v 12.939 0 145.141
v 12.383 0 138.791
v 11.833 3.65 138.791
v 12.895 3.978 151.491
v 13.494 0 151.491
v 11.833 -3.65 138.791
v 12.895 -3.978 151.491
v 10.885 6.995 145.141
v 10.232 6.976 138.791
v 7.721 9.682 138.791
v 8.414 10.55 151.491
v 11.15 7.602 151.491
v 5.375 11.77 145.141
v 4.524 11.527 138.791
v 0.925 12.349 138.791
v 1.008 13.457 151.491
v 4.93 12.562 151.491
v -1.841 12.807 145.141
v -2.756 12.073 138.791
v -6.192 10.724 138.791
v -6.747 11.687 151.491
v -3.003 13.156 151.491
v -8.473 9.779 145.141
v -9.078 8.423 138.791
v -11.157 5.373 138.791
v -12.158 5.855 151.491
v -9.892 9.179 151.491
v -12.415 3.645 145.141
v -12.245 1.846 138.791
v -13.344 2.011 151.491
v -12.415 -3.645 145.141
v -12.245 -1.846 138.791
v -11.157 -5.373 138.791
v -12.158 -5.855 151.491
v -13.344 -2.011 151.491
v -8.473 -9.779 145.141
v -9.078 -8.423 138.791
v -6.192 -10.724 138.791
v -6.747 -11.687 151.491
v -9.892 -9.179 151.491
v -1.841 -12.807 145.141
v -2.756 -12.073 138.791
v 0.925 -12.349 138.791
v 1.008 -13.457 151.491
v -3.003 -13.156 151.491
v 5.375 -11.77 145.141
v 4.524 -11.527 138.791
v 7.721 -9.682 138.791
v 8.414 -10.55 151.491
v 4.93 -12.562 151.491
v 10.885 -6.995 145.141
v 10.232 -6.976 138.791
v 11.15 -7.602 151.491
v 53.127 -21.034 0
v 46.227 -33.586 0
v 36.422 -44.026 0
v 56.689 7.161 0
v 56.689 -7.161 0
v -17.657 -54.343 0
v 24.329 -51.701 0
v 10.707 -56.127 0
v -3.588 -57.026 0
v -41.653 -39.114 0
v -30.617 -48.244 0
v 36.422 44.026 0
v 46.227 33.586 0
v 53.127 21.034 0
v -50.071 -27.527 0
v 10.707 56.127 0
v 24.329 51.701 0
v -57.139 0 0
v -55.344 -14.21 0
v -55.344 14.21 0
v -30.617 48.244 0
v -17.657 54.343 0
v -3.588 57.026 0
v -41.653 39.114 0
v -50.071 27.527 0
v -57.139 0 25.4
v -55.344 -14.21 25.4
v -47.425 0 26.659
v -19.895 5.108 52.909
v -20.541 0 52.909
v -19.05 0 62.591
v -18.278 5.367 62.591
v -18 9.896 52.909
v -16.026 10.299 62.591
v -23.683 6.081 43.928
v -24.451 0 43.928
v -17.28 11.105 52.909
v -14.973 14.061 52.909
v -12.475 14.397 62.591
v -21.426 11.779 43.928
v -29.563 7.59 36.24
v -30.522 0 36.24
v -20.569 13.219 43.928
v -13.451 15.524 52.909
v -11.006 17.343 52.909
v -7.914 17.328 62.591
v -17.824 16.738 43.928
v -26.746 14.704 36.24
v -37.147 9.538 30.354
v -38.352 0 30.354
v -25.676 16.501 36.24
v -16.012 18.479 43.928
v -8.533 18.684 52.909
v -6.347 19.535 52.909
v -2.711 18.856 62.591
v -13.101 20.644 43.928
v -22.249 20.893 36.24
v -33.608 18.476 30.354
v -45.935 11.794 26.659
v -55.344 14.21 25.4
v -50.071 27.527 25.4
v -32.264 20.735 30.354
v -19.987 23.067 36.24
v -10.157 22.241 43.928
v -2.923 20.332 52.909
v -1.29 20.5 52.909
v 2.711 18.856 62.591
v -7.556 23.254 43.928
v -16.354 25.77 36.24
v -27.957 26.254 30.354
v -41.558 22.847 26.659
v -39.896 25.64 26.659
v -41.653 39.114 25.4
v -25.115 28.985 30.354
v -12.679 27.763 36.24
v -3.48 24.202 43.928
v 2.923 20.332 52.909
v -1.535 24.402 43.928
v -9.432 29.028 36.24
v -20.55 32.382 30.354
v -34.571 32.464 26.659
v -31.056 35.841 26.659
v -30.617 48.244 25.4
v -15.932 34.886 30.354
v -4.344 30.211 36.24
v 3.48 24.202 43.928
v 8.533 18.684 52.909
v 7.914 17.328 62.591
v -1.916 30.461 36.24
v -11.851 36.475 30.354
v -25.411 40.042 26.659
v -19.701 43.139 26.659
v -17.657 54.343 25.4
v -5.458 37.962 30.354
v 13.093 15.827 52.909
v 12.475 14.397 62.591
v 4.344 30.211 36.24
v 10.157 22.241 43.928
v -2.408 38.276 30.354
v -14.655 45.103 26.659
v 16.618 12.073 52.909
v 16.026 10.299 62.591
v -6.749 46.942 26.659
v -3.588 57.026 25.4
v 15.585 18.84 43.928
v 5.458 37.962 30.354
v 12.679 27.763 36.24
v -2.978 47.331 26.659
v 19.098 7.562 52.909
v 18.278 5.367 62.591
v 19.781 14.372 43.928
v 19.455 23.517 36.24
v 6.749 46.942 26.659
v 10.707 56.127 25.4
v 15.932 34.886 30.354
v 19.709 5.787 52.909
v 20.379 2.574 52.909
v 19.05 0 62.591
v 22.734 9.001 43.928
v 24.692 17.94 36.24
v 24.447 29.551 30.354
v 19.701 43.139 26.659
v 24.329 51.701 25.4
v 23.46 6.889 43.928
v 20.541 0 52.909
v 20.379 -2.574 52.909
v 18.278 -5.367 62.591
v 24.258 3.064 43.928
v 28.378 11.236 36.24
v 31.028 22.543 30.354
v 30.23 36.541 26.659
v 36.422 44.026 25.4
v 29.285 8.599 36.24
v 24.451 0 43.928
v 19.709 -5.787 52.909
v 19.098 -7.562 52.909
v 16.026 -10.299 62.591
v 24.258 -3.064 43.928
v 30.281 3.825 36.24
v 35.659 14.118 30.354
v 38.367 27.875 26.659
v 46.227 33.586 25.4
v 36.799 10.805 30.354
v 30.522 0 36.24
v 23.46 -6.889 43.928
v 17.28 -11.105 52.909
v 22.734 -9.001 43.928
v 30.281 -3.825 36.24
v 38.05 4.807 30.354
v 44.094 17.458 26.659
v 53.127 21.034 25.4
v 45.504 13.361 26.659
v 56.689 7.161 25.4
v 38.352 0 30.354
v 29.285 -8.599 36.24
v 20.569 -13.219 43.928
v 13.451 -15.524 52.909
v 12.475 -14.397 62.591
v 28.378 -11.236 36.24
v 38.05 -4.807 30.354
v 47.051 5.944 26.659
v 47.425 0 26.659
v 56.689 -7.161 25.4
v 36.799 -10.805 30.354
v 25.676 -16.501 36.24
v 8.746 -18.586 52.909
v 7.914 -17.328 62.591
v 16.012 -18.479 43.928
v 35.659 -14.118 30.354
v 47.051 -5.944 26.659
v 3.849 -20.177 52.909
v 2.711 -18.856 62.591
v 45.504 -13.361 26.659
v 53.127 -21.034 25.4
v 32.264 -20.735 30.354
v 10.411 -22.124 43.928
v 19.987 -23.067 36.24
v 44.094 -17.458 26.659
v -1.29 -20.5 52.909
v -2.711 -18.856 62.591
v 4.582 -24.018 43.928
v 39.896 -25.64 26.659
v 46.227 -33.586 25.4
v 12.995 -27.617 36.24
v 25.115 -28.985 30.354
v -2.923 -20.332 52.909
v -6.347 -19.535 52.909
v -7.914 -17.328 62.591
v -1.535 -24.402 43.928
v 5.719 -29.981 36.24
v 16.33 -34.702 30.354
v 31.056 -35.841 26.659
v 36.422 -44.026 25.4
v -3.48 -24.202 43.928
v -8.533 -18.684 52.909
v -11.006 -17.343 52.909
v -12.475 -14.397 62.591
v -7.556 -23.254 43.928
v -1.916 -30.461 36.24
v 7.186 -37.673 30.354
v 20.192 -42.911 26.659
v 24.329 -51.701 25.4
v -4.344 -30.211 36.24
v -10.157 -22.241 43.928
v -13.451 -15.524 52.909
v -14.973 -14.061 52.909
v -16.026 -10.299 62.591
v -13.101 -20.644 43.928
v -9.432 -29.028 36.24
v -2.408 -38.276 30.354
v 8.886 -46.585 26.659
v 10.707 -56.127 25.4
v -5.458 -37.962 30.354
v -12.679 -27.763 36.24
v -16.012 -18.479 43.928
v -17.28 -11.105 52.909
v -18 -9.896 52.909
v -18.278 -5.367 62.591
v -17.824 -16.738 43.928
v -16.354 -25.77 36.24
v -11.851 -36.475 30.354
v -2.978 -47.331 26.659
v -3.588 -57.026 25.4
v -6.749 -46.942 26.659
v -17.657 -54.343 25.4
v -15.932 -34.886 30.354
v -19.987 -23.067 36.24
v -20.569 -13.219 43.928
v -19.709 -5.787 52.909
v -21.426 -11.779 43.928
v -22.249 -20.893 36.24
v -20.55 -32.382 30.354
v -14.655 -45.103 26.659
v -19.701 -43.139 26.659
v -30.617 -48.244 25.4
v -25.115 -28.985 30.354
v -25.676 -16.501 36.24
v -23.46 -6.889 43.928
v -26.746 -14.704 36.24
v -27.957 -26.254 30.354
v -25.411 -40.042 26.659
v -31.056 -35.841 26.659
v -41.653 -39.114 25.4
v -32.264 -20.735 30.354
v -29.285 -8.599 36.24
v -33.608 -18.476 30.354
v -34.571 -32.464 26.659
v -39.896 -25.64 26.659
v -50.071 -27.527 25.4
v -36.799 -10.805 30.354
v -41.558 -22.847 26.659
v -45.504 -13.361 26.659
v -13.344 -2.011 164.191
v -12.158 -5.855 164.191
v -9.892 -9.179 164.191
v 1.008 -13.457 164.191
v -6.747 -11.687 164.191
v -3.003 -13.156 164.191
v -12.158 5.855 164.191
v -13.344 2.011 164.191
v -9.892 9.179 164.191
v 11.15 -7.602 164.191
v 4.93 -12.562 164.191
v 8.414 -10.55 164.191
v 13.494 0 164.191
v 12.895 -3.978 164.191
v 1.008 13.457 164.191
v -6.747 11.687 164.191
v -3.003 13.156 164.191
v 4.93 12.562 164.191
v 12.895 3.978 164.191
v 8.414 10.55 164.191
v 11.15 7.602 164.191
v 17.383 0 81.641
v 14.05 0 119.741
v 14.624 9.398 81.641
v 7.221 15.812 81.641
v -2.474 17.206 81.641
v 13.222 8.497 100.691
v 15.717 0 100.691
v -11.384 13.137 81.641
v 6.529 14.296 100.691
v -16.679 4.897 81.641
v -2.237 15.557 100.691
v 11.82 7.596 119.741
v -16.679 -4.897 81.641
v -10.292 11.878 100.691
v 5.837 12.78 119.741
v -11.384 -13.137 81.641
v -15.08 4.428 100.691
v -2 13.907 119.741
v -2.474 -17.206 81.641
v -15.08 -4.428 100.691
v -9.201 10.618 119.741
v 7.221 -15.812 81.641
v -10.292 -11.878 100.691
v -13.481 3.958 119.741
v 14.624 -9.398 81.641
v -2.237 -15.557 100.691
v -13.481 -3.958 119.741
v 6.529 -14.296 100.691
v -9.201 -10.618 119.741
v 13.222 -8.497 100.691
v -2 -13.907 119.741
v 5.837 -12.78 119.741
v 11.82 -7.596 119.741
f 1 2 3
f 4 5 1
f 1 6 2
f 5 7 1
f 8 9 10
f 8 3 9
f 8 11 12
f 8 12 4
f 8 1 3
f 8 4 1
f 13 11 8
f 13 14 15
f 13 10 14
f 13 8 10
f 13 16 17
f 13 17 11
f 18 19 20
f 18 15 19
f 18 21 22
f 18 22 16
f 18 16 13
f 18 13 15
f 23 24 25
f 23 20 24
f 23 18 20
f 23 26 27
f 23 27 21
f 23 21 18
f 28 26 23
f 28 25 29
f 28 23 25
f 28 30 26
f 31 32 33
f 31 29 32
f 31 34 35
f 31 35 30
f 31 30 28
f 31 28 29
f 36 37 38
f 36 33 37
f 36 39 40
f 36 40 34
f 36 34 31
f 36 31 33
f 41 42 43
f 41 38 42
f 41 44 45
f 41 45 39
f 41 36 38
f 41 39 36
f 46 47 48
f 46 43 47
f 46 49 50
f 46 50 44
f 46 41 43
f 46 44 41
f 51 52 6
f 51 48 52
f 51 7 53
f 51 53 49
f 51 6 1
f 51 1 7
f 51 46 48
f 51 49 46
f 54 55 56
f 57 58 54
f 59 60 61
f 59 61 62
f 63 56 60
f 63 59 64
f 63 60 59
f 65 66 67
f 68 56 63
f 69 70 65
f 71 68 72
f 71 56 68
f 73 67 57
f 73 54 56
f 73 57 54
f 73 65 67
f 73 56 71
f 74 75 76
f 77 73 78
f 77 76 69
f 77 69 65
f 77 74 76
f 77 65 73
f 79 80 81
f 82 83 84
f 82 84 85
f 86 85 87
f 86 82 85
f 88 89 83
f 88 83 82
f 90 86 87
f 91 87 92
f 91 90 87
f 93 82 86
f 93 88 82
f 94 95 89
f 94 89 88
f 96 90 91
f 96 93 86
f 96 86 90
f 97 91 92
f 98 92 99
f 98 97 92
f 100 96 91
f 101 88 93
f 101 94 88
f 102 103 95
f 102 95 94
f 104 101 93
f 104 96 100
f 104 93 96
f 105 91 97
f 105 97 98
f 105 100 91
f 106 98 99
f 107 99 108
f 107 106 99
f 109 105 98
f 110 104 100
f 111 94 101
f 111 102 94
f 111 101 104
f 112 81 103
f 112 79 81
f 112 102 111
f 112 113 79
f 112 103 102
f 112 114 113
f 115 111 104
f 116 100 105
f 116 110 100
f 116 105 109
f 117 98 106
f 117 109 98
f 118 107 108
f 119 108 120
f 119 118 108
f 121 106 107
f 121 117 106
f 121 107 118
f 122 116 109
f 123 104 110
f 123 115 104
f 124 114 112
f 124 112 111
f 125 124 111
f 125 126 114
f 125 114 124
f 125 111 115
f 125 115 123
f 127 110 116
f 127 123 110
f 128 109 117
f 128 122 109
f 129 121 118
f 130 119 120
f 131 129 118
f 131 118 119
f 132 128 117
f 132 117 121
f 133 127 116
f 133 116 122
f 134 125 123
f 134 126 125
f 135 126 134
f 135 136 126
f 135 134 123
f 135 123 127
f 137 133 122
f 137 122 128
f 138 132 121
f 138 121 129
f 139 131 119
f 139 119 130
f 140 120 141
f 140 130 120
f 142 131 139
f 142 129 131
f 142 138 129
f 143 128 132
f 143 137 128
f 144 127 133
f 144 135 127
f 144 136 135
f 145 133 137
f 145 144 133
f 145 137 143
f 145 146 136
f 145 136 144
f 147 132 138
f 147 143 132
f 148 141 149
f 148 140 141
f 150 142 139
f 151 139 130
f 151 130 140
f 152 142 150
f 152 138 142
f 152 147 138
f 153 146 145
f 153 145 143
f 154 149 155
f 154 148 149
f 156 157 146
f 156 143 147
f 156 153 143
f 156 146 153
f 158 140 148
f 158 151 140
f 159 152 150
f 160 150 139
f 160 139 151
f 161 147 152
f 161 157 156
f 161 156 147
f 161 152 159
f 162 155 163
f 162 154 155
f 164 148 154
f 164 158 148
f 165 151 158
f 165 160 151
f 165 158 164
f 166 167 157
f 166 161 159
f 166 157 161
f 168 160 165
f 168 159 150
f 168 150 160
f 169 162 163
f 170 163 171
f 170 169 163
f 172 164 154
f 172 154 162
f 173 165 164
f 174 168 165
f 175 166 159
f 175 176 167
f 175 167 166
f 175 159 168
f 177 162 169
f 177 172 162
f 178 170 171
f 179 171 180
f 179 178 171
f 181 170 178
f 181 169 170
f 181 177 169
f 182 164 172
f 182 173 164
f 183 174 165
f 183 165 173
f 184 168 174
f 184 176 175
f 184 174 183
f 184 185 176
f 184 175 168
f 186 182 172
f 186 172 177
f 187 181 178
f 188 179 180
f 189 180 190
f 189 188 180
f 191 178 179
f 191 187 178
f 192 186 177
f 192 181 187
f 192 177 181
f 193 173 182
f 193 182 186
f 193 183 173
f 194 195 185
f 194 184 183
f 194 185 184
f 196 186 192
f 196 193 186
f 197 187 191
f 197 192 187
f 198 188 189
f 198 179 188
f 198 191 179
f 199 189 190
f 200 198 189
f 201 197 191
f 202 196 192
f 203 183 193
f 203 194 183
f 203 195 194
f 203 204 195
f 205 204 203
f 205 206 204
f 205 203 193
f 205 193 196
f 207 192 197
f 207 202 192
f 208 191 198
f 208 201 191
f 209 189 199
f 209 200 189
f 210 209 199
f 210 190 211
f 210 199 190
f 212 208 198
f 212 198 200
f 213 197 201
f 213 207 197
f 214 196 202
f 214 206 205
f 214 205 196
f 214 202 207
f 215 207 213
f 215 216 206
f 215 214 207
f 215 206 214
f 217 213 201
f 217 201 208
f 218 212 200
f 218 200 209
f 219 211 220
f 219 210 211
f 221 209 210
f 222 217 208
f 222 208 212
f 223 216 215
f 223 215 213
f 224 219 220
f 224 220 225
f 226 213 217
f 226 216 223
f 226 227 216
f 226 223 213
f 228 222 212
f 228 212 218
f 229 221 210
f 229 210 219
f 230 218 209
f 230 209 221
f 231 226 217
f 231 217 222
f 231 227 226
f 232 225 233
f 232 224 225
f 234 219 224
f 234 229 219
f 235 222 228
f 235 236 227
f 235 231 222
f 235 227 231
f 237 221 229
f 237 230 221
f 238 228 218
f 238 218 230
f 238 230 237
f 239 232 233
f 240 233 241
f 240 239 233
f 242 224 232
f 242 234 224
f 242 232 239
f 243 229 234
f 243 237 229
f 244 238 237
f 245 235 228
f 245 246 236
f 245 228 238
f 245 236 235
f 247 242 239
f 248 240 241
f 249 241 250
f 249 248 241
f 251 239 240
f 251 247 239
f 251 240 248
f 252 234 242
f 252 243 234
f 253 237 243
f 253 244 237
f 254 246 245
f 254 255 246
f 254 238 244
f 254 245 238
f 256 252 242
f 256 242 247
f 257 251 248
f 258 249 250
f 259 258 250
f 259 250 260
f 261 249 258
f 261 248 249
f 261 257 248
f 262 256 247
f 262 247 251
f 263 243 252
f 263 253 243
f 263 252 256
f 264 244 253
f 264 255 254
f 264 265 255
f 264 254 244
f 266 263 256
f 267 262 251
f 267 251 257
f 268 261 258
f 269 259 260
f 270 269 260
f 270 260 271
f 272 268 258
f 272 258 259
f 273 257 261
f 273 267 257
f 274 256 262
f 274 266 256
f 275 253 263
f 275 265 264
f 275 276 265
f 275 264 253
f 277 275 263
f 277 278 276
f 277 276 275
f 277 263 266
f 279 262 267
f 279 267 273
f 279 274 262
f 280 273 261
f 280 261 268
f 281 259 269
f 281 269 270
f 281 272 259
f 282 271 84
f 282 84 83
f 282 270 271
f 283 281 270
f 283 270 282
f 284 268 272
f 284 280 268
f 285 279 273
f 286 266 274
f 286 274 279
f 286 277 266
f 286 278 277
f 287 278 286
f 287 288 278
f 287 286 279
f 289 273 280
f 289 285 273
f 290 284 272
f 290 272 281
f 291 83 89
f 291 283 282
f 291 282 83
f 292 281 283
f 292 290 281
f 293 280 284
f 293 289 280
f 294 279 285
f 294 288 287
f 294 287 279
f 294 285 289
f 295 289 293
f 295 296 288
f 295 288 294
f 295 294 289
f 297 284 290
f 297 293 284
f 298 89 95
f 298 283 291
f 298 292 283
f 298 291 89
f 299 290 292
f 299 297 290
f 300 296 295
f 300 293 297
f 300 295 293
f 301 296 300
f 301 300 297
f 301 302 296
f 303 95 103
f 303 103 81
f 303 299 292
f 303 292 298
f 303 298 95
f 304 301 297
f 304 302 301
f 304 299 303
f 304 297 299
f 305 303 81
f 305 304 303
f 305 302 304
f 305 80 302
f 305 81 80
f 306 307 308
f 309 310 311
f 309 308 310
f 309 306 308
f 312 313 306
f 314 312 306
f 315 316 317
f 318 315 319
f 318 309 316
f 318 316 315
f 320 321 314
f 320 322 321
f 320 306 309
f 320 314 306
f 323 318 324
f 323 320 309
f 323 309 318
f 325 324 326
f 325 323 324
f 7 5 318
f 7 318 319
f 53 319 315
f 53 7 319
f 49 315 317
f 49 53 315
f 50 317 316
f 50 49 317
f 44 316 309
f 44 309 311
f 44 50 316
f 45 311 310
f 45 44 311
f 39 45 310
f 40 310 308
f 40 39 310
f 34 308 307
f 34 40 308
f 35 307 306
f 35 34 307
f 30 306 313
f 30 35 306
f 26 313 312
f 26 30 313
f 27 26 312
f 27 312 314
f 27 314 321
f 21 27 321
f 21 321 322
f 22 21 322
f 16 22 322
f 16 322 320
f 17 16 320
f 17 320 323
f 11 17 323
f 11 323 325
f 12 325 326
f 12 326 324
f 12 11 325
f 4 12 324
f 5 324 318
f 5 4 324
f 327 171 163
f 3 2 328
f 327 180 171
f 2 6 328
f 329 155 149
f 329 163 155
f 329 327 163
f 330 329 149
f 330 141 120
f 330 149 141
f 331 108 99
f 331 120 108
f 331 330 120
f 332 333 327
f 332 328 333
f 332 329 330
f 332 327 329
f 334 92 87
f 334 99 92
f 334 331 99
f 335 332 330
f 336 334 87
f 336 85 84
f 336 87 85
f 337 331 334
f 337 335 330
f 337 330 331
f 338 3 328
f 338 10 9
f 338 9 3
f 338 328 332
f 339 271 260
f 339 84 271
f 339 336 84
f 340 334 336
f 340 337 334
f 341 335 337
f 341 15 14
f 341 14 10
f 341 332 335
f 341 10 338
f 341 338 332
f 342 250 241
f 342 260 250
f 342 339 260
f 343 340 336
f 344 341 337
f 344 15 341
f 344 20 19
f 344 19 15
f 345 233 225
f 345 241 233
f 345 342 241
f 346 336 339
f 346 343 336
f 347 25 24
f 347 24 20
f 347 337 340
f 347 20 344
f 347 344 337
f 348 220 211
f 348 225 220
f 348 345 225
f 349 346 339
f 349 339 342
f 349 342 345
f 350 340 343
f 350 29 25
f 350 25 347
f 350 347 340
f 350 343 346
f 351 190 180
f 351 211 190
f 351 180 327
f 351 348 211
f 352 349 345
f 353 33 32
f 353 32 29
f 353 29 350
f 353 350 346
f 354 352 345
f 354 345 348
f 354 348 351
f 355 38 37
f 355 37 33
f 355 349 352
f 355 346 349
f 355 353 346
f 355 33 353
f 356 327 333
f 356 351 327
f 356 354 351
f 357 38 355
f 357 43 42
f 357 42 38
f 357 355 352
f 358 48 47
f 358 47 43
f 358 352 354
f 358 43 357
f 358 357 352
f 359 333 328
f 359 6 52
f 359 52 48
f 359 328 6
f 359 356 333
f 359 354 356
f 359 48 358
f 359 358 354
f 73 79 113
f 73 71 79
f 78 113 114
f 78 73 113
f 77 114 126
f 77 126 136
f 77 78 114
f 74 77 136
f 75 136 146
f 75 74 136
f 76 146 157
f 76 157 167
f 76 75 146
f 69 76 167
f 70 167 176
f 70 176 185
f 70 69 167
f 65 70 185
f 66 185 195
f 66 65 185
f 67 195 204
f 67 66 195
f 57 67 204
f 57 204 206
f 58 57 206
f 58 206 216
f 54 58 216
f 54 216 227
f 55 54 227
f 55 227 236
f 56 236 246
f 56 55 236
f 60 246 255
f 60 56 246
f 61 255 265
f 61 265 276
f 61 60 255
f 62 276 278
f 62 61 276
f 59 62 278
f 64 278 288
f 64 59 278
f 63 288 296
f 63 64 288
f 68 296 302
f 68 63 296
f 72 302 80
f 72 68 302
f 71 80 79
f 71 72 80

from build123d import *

# Parameters (mm, degrees)
F1_FACE_R = 19.05
F2_DEPTH  = 76.2
F2_TAPER  = 5
F2_FACE_R = 12.3833638393
F3_DEPTH  = 12.7
F3_TAPER  = -5
F4_DEPTH  = 12.7


with BuildPart() as f1:
    # F0 (on Front) → F1 (revolve)
    with BuildSketch(Plane.XZ):
        with BuildLine():
            Line((-57.1391619384, 0), (0, 0))
            Line((0, 0), (0, 62.5912960728))
            Line((0, 62.5912960728), (-19.05, 62.5912960728))
            ThreePointArc((-19.05, 62.5912960728), (-30.5216077648, 36.2398494169), (-57.1391619384, 25.4))
            Line((-57.1391619384, 25.4), (-57.1391619384, 0))
        make_face()
    revolve(axis=Axis((0, 0, 31.2956480364), (0, 0, -1)))

    # F1_face (on face) → F2 (join)
    with BuildSketch(Plane.XY.offset(62.5912960728)):
        Circle(F1_FACE_R)
    extrude(amount=F2_DEPTH, taper=F2_TAPER)

    # F2_face (on face) → F3 (join)
    with BuildSketch(Plane.XY.offset(138.7912960728)):
        Circle(F2_FACE_R)
    extrude(amount=F3_DEPTH, taper=F3_TAPER)

    # F4 (add): a face of the model
    f4_faces = [f1.faces().sort_by_distance(p)[0] for p in [
        (0, 0, 151.4912960728),
    ]]
    extrude(f4_faces, amount=F4_DEPTH)


solid = f1.part
